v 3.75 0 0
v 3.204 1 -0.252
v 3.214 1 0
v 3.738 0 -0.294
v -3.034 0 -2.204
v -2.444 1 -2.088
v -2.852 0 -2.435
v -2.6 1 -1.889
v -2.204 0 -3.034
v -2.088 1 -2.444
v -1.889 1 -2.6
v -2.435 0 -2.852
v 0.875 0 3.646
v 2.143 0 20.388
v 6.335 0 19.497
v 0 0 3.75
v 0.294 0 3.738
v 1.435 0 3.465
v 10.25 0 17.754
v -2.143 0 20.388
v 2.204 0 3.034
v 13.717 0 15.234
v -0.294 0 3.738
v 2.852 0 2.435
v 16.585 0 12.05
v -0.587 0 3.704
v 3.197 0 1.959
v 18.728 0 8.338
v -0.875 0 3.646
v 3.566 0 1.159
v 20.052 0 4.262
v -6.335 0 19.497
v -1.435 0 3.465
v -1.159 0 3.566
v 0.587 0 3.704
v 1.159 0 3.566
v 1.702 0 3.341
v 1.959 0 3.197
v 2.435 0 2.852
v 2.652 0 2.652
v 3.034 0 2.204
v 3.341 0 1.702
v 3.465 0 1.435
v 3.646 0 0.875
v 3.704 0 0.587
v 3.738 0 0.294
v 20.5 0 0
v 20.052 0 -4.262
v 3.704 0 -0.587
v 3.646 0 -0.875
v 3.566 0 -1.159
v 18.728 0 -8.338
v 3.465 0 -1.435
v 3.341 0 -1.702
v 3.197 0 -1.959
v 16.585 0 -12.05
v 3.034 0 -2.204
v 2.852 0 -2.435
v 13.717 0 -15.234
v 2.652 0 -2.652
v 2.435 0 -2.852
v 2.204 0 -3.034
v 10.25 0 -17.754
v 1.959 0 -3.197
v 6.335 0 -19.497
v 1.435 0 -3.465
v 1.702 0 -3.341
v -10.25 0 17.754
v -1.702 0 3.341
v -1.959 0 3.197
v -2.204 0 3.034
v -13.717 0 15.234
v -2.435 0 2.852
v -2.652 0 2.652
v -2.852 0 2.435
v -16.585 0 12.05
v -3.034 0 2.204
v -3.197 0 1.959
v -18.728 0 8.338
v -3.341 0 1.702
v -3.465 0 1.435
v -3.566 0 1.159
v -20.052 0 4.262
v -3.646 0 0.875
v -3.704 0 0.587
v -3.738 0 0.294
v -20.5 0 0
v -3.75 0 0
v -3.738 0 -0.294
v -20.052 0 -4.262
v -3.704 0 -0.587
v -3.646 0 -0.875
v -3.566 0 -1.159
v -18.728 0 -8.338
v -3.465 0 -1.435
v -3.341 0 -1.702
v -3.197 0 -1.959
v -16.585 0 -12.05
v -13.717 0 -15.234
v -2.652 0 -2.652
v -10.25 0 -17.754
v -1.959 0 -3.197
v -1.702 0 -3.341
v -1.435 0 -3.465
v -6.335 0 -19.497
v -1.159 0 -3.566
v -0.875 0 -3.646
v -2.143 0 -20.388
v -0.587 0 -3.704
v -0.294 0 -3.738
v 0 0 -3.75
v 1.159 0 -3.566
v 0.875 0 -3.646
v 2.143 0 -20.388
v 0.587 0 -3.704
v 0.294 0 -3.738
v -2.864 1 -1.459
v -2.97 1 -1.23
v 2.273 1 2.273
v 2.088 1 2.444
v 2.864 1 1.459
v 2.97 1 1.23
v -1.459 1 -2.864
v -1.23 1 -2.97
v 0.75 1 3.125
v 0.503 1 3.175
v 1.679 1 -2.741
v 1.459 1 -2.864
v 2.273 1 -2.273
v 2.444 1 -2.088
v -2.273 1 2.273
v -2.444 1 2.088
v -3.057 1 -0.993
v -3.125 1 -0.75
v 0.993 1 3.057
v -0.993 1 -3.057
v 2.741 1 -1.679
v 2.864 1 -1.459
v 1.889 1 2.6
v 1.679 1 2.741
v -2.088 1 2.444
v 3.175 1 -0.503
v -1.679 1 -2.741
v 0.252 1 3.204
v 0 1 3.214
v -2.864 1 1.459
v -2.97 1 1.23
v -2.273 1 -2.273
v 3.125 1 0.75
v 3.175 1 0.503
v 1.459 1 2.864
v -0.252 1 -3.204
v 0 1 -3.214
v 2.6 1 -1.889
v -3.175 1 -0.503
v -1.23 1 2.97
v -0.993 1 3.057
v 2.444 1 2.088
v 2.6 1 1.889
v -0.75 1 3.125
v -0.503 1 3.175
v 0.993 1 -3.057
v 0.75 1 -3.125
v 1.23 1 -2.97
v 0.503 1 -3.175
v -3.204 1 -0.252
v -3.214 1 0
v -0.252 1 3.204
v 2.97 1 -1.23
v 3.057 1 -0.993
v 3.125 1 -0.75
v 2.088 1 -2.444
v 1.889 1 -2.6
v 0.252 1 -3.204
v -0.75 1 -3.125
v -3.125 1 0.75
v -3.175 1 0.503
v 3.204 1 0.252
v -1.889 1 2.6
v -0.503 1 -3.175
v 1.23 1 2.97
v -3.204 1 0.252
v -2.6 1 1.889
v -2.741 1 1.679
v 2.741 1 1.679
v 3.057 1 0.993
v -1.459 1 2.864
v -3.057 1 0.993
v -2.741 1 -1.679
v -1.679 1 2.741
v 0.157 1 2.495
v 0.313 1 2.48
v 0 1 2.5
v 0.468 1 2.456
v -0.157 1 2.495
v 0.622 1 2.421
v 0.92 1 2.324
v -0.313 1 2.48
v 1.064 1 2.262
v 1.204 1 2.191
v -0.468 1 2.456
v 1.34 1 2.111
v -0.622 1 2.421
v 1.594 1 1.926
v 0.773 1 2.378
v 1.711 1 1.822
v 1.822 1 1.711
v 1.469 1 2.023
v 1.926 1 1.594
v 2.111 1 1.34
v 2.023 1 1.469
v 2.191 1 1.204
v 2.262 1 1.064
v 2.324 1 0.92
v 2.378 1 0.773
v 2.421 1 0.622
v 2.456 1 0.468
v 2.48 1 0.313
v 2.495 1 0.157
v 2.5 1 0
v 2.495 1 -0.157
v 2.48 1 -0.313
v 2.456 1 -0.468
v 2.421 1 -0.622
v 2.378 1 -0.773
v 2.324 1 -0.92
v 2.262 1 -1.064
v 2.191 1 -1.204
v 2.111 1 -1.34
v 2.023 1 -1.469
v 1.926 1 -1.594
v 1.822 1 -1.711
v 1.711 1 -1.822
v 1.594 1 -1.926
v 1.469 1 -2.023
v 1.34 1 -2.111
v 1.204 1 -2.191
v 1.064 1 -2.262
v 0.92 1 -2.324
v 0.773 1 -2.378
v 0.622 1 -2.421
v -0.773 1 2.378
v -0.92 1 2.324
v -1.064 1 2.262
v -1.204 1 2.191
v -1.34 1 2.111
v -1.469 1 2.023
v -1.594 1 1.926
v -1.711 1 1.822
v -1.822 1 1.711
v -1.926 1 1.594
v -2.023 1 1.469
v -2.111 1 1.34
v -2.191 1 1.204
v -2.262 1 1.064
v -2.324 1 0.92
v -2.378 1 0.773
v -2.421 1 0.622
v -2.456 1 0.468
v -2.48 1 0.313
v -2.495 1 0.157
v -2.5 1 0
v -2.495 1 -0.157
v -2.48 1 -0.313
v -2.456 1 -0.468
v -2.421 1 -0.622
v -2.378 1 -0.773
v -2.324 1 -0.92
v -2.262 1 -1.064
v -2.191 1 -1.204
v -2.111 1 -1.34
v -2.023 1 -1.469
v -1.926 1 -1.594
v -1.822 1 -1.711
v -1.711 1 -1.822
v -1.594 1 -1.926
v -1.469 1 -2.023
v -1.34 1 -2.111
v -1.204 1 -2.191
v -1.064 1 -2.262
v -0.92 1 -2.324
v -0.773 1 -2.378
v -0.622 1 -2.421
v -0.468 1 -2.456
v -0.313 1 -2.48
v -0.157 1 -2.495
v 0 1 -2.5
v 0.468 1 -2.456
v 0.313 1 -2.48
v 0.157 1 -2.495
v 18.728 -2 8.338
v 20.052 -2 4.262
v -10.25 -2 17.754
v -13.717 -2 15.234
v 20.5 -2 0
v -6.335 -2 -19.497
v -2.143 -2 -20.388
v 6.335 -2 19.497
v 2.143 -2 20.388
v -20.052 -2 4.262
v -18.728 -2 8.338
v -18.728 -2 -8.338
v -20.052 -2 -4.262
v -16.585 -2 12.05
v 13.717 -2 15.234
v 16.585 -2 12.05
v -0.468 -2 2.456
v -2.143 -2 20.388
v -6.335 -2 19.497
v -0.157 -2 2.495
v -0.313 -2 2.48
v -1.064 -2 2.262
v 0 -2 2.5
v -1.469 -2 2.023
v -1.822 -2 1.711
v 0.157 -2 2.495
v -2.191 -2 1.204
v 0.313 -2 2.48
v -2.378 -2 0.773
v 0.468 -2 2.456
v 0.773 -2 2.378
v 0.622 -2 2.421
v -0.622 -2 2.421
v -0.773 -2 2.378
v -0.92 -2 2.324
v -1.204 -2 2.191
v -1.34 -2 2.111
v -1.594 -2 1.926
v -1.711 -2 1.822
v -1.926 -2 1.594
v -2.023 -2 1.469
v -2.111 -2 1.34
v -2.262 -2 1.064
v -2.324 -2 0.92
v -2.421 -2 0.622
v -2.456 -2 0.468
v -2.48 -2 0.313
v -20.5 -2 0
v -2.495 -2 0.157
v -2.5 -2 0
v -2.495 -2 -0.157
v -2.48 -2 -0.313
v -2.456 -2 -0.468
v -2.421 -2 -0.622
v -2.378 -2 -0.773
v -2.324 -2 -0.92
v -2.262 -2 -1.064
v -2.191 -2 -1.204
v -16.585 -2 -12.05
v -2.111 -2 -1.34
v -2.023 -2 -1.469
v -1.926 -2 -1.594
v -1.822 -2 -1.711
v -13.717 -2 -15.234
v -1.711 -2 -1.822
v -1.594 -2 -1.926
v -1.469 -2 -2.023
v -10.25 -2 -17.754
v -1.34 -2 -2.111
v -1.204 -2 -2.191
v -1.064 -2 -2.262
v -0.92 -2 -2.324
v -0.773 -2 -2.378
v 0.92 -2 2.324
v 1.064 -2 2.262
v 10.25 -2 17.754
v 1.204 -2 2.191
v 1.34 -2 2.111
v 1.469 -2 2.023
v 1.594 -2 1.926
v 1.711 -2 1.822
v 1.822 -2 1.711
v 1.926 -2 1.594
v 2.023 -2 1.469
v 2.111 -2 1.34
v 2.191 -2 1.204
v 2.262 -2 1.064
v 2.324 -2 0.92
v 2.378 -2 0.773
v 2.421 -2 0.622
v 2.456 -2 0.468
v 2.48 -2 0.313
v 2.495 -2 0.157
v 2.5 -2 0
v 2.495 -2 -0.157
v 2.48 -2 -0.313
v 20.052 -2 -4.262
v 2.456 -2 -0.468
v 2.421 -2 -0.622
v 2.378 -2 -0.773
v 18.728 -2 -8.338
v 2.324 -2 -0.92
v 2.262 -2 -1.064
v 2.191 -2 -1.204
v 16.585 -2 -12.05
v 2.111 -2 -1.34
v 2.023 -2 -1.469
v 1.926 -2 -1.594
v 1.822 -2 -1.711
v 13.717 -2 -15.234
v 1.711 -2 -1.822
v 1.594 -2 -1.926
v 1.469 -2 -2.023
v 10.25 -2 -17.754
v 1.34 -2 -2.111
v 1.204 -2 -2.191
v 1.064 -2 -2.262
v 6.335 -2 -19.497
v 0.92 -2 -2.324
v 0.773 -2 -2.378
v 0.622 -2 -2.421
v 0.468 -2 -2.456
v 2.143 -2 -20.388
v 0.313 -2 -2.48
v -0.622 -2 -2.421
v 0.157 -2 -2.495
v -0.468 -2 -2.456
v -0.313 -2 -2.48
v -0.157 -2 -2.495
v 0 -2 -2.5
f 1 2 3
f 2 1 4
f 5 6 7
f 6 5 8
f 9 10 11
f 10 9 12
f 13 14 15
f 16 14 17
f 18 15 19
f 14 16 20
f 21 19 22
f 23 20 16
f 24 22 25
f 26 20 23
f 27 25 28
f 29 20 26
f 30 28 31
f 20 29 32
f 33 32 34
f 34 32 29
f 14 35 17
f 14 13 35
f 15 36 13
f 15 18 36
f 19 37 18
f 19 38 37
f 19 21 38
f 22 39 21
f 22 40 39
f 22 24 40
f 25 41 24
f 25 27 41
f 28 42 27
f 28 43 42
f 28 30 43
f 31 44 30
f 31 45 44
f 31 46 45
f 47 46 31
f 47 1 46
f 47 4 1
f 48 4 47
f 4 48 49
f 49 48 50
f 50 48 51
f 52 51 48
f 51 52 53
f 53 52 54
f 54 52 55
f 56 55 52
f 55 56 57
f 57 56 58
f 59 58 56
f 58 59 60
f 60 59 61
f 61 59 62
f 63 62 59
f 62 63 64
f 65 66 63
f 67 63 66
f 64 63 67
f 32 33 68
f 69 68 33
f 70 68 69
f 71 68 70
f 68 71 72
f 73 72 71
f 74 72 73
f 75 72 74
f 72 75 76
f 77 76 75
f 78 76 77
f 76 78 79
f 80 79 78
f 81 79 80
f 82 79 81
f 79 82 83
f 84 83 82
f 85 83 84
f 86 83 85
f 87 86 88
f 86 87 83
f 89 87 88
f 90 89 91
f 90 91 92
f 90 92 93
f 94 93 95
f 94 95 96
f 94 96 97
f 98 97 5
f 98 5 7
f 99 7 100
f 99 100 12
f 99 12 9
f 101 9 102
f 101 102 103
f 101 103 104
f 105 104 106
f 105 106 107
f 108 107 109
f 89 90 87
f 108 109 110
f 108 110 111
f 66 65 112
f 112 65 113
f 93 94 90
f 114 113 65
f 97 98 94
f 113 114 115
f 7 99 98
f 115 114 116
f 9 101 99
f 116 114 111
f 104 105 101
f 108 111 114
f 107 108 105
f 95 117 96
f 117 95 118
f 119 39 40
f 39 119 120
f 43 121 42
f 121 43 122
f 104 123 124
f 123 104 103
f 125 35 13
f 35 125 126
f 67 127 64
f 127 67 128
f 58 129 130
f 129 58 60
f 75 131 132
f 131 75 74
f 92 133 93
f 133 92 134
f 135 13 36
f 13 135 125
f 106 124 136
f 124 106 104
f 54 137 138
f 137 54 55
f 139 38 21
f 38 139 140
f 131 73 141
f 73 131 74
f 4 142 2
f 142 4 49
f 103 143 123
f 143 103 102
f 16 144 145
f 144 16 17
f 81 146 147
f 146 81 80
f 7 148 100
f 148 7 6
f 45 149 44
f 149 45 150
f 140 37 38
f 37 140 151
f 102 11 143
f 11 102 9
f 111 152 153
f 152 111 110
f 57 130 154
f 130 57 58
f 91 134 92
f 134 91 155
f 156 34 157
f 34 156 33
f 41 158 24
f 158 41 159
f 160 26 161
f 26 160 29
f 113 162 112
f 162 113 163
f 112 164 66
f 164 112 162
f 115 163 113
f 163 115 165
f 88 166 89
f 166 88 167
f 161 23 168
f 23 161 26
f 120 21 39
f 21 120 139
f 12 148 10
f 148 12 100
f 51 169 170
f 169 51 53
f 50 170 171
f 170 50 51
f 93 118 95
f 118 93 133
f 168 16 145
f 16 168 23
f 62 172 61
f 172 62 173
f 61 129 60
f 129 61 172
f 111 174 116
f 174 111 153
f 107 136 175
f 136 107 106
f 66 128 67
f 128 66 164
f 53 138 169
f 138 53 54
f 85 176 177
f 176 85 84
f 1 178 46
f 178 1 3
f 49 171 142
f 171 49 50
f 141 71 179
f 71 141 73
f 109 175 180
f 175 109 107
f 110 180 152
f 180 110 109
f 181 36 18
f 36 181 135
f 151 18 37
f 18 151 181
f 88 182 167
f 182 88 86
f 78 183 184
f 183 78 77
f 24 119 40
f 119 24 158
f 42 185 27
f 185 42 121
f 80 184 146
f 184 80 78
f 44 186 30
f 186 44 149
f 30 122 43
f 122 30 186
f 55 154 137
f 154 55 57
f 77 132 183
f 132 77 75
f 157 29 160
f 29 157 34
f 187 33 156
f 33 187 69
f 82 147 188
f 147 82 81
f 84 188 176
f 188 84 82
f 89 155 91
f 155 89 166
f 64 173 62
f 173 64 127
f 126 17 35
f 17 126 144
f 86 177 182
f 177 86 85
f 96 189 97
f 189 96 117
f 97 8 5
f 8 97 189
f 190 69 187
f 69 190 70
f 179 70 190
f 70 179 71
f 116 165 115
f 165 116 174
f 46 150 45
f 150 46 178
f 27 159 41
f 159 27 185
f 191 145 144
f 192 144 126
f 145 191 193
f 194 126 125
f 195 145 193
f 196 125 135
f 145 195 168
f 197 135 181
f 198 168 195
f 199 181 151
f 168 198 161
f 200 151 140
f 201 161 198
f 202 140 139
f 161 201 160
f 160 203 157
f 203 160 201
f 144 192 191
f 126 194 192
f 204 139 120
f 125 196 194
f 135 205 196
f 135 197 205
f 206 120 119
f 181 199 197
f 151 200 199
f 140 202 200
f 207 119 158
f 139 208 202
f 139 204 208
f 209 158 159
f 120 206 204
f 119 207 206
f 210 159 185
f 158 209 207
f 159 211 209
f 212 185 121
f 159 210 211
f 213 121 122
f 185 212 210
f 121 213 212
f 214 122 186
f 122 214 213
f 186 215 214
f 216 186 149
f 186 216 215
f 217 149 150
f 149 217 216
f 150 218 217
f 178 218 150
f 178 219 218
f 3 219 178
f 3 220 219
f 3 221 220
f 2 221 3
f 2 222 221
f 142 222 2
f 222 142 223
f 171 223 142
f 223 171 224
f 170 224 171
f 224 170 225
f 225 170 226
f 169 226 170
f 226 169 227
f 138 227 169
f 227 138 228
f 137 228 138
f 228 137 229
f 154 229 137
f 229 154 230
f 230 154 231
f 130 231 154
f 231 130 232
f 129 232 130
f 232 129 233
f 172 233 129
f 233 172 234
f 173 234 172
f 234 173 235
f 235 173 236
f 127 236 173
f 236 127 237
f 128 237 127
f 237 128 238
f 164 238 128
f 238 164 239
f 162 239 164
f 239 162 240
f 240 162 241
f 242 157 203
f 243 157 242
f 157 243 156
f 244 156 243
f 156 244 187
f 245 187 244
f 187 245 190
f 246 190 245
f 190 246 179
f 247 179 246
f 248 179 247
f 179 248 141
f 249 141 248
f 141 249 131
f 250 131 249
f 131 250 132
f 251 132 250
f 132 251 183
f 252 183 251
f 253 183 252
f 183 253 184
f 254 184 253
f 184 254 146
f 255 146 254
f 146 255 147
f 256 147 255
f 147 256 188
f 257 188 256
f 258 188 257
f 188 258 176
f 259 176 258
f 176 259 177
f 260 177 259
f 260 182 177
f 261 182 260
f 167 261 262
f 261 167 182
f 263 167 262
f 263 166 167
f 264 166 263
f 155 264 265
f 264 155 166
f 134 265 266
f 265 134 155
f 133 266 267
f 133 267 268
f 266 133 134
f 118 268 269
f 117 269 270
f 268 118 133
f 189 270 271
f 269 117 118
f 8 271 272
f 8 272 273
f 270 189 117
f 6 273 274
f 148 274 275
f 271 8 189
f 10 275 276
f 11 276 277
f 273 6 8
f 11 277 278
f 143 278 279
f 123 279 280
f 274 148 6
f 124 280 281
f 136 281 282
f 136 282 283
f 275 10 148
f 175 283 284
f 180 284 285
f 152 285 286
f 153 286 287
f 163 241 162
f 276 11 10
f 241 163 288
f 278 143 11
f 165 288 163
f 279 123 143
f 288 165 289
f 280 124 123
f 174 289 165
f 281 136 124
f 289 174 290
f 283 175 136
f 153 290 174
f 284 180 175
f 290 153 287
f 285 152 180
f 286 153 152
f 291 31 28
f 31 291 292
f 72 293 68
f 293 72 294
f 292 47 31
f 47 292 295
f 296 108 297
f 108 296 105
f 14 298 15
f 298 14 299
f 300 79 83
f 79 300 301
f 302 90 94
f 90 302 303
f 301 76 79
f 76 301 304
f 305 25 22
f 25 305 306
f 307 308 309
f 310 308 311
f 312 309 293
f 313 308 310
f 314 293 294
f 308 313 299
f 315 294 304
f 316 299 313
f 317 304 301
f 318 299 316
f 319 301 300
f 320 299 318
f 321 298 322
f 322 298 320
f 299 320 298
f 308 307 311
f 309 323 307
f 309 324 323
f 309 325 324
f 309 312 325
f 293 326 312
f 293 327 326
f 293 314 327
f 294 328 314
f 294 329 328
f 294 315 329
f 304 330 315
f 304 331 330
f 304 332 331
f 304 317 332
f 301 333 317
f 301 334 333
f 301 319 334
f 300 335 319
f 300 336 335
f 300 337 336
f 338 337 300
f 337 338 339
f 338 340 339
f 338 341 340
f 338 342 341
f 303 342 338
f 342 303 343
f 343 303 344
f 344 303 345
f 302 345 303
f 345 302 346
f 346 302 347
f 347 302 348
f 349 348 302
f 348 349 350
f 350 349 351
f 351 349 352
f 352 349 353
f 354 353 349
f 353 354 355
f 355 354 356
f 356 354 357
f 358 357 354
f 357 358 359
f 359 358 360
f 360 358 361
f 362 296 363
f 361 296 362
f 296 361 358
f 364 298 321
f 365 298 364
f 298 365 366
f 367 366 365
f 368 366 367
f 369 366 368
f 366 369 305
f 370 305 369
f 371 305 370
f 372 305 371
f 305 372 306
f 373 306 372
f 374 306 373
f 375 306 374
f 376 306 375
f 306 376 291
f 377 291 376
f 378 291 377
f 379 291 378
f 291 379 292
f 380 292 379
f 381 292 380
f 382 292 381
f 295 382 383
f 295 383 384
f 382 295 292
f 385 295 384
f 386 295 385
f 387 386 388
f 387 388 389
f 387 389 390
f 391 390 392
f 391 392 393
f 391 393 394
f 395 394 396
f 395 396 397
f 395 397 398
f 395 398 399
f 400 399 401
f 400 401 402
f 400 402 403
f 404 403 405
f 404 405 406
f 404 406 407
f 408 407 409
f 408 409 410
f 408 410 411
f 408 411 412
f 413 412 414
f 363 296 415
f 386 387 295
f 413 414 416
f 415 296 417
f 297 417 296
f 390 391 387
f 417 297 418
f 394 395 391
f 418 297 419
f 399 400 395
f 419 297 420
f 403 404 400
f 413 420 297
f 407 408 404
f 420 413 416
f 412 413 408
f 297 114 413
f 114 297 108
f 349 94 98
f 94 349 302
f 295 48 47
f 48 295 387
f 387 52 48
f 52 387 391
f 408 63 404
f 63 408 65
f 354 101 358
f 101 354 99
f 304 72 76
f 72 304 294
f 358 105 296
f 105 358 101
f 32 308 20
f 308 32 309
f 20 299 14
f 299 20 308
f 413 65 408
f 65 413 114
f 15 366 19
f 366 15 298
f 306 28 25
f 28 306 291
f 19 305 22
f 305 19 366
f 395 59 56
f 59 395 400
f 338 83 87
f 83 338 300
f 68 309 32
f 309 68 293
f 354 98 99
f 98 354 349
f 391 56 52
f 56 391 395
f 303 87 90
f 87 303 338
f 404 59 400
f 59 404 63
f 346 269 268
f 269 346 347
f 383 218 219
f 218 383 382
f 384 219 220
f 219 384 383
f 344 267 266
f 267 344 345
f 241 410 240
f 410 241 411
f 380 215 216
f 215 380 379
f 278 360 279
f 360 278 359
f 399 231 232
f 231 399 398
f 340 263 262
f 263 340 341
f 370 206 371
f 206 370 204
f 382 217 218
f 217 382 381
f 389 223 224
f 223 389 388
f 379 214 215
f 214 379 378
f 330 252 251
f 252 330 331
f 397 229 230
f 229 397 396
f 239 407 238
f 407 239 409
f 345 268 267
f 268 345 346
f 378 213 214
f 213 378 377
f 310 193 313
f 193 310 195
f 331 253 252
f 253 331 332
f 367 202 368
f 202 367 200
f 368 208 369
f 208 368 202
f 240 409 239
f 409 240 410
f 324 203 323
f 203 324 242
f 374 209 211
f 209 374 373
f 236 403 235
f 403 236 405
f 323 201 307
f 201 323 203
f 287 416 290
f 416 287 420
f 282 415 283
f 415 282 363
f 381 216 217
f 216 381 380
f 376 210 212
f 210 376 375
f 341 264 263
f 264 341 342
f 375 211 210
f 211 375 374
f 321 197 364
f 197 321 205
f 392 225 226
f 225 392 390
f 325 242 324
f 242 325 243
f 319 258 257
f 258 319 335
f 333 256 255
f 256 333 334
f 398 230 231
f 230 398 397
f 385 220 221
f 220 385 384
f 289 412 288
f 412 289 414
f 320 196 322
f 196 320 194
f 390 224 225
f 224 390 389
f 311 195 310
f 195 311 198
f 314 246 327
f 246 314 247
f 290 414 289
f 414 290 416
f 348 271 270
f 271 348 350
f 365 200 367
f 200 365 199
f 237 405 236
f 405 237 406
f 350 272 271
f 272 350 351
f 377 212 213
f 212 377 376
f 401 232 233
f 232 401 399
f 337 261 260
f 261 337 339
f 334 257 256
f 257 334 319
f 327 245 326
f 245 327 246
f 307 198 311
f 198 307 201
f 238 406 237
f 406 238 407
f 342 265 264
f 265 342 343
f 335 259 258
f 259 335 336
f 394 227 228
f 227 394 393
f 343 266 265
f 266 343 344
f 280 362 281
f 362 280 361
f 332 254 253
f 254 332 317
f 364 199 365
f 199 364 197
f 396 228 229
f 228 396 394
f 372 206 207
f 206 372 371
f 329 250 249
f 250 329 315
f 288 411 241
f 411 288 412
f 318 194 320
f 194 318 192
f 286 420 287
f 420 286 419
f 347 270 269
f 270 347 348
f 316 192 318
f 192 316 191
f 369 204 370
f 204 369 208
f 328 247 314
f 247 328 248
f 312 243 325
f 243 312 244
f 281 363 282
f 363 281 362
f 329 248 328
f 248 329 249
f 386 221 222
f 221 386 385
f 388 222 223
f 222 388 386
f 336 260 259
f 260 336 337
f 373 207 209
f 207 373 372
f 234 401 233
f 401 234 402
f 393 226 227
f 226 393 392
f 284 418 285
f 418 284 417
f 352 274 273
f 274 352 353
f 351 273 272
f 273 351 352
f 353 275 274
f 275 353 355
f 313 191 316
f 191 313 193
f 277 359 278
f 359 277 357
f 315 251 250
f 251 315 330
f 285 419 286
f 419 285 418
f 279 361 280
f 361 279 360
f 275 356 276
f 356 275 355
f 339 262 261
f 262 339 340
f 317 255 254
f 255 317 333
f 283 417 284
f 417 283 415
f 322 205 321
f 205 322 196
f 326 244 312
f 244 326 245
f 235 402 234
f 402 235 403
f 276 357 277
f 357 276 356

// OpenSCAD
// file: motor.scad
include <../params.scad>



// for local tests only
motor();


module motor() {
    motor_axis();
    motor_block();
}

module motor_axis(radiusPadding=0, with_flat_section=true) {
    difference() {
        rotate([90,0,0])
        cylinder(motor_axis_length,r=motor_axis_radius+radiusPadding,center=false,$fn=100);
        
        if (with_flat_section) {
            translate([-5,-motor_axis_length-1,motor_axis_radius_flat])
            cube([10,motor_axis_length+2,10],center=false);
        }
    }
}

module motor_block() {
    rotate([90,0,0])
    translate([0,0,-motor_disk_length])
    cylinder(motor_disk_length,r=motor_disk_diameter/2,center=false,$fn=30);
        
    difference() {
        rotate([90,0,0])
        translate([-motor_block_side/2,-motor_block_side/2,-motor_block_length-motor_disk_length])
        cube([motor_block_side,motor_block_side,motor_block_length],center=false);
        
        for(i=[0:1:3]) {
            rotate([0,45+90*i,0])
            translate([0,0,motor_block_flat_diameter/2])
            motor_block_edge_cutter();
        }
    }
}

module motor_block_edge_cutter() {
    rotate([90,0,0])
    translate([-motor_block_side/2,0,-motor_block_length-motor_disk_length-1])
    cube([motor_block_side,10,motor_block_length+2],center=false);
}
// file: utils.scad
module trapezoid(len1, len2, h, thickness, top_offset_x = 0) {
    linear_extrude(height=thickness, center=true, scale = 1.0, $fn = 16) {
        polygon(points = [
            [-len1/2, -h/2],
            [len1/2, -h/2],
            [len2/2 + top_offset_x, h/2],
            [-len2/2 + top_offset_x, h/2],
        ]);
    }
}
// file: ../params.scad
thickness=2;

// params for the central cylinder
inner_tube_length=50;
inner_tube_radius=20;

cylinder_radius_margin=0.5;

rear_axis_radius=3;
rear_axis_length=10;
rear_axis_padding=1;
front_axis_padding=1;

// params for holes in the central cylinder
hole_depth=inner_tube_radius-5;
hole_length=inner_tube_length-1;
hole_width=inner_tube_radius*0.7;
bottom_hole_width=inner_tube_radius*0.7;

// shell
shell_plate_width = inner_tube_radius * 1.5 + thickness * 2;
shell_plate_length = inner_tube_length + thickness * 3;
shell_plate_thickness = 3;
shell_plate_wing_height = 10;

// motor
motor_total_length=71.35;
motor_block_length=47.3;
motor_block_side=42.3;
motor_block_flat_diameter=53.6;
motor_block_and_disk_length=49;
motor_disk_diameter=22;
motor_disk_length=motor_block_and_disk_length - motor_block_length;
motor_axis_length=motor_total_length - motor_block_and_disk_length;
motor_axis_diameter=5;
motor_axis_diameter_flat=4.5;
motor_axis_radius=motor_axis_diameter / 2;
motor_axis_radius_flat=motor_axis_diameter_flat - motor_axis_radius;

// motor holder
motor_support_width=50;
motor_support_height=51;
motor_support_length=54;
motor_support_hole_length=33.5;
motor_support_hole_width=4;
motor_support_motor_hole_dist_top=9.5;
motor_support_motor_hole_center_height=motor_support_height-motor_support_motor_hole_dist_top-motor_disk_diameter/2;




reservoirH=30;

// connector male/female
plug_diameter_max=67.3;
plug_diameter_min=62;
plug_holders_diameter=64.3;
plug_holders_width=15;
plug_holders_height=1.5;
plug_guide_diameter=66.85;
plug_guide_width=16;
plug_wall_depth=1.5;
plug_height_male=17;
plug_height_female=14.5;
plug_female_offset = plug_wall_depth + 0.5;
// main file
include <../params.scad>

use <utils.scad>
use <motor.scad>

// for local tests only
shell_door();


module shell_door() {
    difference() {
        // door
        shell_door_without_hole();

        // hole
        translate([0,10,0])
        motor_axis(0, false);
    }
}

module shell_door_without_hole() {
    rotate([90,0,0])
    cylinder(thickness, r = inner_tube_radius + cylinder_radius_margin, center=false);

    door_spacer(7, motor_axis_radius, rear_axis_padding);
}

module door_spacer(total_height, axis_radius, spacer_height) {
    radius_bottom=axis_radius*1.5;
    
    // truncated cone
    rotate([-90,0,0])
    difference() {
        cylinder(total_height,r1=radius_bottom, r2=0,$fn=80,center=false);
        
        translate([0,0,total_height/2+spacer_height])
        cube([total_height*2,total_height*2,total_height], center=true);
    }
}
